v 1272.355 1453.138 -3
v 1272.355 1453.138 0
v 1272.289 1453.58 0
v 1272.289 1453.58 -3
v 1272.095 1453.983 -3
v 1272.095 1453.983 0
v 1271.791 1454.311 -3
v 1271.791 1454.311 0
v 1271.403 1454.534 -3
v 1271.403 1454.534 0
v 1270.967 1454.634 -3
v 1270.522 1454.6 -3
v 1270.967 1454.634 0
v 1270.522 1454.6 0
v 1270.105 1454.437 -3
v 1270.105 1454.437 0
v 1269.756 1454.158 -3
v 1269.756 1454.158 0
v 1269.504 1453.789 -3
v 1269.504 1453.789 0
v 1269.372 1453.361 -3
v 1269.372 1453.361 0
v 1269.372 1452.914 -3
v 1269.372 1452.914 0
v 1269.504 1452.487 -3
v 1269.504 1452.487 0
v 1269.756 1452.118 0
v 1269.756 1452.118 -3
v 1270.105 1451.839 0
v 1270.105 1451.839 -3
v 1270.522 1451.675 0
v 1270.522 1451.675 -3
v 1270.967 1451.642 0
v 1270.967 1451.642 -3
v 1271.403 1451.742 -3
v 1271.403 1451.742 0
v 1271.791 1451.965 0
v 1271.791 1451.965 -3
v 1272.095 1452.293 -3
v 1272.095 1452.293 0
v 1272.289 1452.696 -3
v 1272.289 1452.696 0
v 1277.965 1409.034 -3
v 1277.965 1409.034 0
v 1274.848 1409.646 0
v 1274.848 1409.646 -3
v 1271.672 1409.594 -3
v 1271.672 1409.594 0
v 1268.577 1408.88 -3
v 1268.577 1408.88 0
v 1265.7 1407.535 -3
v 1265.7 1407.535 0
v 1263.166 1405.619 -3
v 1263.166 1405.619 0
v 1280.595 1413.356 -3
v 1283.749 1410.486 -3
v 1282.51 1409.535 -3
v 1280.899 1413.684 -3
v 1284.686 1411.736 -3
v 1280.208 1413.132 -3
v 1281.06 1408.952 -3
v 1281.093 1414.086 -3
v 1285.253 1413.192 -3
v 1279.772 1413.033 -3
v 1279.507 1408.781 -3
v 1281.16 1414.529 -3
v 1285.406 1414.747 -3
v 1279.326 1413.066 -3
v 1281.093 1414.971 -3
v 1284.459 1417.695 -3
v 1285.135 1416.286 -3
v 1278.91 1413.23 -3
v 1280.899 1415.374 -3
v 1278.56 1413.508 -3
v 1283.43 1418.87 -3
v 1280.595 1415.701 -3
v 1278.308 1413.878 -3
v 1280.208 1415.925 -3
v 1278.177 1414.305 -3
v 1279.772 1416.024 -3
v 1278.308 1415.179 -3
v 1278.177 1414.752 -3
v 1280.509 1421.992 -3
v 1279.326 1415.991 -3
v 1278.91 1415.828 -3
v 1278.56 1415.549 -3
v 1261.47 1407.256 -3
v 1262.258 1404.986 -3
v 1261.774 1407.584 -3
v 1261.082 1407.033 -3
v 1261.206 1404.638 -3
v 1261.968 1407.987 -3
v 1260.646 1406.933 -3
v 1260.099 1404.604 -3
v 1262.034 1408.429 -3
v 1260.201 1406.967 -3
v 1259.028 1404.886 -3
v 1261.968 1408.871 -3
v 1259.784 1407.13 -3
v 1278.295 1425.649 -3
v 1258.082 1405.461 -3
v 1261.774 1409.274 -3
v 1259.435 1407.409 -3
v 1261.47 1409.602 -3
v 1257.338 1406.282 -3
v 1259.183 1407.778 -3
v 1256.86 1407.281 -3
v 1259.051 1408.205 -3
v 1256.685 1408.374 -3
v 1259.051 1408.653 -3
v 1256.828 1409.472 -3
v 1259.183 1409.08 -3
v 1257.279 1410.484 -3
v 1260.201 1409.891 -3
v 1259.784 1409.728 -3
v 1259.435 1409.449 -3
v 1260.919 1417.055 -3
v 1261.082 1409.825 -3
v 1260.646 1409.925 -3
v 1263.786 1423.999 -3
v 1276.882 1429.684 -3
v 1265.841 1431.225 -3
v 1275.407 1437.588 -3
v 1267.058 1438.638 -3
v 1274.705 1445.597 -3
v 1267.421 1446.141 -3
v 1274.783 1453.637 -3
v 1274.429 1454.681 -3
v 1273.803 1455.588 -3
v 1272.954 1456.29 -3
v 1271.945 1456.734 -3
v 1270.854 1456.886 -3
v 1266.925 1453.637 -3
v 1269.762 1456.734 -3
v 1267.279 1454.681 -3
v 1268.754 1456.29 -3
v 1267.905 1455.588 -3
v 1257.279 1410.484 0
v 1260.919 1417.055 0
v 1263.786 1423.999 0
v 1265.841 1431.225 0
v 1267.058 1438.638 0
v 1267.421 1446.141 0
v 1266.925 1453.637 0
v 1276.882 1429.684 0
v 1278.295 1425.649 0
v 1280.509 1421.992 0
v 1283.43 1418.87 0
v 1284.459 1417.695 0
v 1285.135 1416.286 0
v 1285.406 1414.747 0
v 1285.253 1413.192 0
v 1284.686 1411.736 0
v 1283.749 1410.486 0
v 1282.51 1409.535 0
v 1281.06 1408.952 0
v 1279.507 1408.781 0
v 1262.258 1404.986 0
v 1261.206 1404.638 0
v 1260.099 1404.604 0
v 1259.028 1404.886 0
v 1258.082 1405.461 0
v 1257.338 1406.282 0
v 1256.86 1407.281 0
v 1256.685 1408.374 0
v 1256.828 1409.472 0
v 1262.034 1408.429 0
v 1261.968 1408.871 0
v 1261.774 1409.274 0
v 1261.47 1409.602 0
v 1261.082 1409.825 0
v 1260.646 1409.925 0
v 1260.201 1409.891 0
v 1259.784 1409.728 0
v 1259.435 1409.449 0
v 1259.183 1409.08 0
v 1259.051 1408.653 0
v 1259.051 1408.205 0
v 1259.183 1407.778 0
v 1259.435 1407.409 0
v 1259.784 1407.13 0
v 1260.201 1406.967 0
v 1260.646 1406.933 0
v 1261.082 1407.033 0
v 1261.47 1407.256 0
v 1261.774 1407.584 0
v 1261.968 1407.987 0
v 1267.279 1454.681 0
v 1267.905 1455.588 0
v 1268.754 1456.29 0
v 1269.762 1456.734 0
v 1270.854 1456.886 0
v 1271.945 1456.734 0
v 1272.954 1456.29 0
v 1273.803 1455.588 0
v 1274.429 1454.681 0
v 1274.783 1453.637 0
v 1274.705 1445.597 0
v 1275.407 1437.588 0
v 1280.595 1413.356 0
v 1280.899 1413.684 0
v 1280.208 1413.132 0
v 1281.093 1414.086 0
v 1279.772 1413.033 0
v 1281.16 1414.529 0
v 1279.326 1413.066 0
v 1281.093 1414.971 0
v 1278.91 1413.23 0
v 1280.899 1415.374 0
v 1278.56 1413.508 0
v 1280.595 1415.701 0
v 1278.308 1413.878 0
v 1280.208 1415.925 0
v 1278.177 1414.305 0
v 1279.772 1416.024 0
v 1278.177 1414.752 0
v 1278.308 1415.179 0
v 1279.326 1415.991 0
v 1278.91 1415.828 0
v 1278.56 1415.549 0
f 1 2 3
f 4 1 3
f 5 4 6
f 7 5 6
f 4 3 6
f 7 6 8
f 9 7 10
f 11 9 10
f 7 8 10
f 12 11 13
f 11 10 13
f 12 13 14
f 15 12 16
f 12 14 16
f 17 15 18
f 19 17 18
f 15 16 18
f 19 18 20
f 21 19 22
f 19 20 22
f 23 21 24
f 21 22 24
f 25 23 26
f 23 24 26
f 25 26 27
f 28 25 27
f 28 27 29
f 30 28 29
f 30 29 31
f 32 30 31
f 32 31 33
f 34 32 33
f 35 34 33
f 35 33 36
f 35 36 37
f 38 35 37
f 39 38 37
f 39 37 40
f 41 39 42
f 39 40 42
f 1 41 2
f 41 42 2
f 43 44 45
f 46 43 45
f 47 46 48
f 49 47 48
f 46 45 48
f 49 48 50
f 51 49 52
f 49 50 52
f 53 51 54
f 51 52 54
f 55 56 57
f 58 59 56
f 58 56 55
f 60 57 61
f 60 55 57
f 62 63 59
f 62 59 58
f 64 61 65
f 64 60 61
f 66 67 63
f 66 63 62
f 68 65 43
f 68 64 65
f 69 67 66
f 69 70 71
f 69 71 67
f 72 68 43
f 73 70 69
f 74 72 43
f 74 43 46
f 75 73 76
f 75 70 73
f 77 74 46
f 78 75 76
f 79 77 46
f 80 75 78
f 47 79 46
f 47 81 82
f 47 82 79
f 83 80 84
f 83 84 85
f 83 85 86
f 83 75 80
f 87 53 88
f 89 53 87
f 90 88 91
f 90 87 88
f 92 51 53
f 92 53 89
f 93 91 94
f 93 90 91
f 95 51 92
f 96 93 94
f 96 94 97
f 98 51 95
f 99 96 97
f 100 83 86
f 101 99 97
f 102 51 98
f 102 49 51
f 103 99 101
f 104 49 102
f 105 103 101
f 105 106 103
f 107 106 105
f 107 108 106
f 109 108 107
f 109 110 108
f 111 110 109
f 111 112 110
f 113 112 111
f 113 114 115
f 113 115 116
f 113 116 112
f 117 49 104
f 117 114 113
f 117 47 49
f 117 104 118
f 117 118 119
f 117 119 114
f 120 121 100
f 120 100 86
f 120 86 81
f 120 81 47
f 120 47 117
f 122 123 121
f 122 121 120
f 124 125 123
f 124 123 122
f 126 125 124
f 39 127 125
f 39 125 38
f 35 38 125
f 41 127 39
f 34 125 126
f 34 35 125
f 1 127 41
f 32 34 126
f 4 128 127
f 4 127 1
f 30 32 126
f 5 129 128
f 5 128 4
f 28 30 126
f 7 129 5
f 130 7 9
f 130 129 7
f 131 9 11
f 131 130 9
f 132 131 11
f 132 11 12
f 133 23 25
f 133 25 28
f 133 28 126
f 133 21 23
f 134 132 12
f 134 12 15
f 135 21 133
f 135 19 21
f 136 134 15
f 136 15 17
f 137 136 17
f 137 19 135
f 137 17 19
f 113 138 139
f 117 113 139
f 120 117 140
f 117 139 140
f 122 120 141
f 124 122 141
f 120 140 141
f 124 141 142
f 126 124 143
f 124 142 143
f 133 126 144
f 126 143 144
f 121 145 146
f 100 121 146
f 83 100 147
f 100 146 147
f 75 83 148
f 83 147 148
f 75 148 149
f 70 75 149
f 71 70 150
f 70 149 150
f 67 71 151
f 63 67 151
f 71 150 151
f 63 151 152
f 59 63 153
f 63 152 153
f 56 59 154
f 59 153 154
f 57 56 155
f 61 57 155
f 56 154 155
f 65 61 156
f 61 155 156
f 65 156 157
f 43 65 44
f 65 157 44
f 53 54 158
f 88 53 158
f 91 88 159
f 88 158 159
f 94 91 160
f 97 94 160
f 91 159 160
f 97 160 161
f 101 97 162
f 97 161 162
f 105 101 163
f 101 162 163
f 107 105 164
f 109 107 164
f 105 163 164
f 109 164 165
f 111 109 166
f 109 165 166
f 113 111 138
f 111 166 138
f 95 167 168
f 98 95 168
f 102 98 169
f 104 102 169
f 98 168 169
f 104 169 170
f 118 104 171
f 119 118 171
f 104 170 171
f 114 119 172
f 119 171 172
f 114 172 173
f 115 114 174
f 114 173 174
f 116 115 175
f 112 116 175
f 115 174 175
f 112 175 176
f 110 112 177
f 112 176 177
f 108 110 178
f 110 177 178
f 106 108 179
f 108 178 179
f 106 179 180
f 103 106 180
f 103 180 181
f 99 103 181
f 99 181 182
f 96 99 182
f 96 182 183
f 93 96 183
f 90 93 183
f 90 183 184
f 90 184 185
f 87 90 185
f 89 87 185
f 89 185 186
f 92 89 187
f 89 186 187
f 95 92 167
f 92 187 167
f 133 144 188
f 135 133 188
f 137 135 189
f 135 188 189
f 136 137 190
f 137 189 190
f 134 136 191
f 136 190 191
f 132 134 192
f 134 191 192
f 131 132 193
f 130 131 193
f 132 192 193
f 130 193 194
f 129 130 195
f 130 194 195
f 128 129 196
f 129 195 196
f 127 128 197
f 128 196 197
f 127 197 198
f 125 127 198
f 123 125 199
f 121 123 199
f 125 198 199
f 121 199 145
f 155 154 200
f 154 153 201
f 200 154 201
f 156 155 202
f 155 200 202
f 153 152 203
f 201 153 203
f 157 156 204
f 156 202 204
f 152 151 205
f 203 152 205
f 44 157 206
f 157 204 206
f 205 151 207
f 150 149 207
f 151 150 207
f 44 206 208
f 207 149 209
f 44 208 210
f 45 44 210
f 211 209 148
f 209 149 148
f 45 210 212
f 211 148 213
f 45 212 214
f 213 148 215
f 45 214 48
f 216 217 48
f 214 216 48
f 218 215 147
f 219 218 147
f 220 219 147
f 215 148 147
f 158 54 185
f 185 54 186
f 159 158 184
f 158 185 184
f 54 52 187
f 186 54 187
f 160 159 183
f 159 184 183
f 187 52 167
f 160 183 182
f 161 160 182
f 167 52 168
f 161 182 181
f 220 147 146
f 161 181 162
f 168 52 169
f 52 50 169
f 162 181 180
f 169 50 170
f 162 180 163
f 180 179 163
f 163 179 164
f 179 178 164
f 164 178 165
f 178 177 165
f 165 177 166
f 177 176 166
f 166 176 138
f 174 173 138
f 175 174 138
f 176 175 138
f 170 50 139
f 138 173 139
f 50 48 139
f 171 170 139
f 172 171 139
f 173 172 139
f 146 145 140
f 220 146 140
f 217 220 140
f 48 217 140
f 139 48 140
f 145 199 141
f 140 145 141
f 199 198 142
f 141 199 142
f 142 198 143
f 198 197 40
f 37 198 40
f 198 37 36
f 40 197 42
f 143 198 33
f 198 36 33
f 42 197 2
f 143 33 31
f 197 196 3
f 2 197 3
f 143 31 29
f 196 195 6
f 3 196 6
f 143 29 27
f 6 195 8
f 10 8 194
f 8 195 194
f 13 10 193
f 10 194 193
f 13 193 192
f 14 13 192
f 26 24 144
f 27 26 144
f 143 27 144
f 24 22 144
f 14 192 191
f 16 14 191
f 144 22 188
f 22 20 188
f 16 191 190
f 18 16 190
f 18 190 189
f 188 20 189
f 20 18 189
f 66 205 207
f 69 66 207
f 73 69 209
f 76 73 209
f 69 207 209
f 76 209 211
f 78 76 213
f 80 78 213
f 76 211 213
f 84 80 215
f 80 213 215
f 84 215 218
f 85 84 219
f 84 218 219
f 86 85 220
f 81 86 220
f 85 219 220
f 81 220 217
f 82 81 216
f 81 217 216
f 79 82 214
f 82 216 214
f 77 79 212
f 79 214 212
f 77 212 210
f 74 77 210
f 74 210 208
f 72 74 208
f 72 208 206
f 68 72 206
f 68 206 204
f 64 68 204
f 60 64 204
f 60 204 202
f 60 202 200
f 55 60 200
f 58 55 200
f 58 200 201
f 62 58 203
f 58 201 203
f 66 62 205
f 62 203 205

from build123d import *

# Parameters (mm, degrees)
ESQUISSE1_R               = 1.5
T_LE_DE_BASE_PLI_E1_DEPTH = 3


# Sheet-metal steps are written as plain solids
with BuildPart() as part:
    # Esquisse1 → Tôle de base pliée1 (new body)
    with BuildSketch(Plane.XY):
        with BuildLine():
            ThreePointArc((1266.925045451, 1453.637099805), (1270.853858472, 1456.885815408), (1274.782671493, 1453.637099805))
            ThreePointArc((1274.782671493, 1453.637099805), (1274.958888422, 1441.583989625), (1276.882340742, 1429.684038004))
            ThreePointArc((1276.882340742, 1429.684038004), (1279.307388945, 1423.763410381), (1283.429682965, 1418.870417202))
            ThreePointArc((1283.429682965, 1418.870417202), (1284.686333081, 1411.736203474), (1277.965134068, 1409.03404529))
            ThreePointArc((1277.965134068, 1409.03404529), (1270.106079959, 1409.318689972), (1263.166360558, 1405.619223969))
            ThreePointArc((1263.166360558, 1405.619223969), (1258.081900759, 1405.461151241), (1257.278806491, 1410.484273581))
            ThreePointArc((1257.278806491, 1410.484273581), (1265.841325108, 1431.224793872), (1266.925045451, 1453.637099805))
        make_face()
        with Locations((1279.65990658, 1414.528610435)):
            Circle(ESQUISSE1_R, mode=Mode.SUBTRACT)
        with Locations((1260.534319165, 1408.429002982)):
            Circle(ESQUISSE1_R, mode=Mode.SUBTRACT)
        with Locations((1270.855299475, 1453.137882296)):
            Circle(ESQUISSE1_R, mode=Mode.SUBTRACT)
    extrude(amount=-T_LE_DE_BASE_PLI_E1_DEPTH)


solid = part.part
